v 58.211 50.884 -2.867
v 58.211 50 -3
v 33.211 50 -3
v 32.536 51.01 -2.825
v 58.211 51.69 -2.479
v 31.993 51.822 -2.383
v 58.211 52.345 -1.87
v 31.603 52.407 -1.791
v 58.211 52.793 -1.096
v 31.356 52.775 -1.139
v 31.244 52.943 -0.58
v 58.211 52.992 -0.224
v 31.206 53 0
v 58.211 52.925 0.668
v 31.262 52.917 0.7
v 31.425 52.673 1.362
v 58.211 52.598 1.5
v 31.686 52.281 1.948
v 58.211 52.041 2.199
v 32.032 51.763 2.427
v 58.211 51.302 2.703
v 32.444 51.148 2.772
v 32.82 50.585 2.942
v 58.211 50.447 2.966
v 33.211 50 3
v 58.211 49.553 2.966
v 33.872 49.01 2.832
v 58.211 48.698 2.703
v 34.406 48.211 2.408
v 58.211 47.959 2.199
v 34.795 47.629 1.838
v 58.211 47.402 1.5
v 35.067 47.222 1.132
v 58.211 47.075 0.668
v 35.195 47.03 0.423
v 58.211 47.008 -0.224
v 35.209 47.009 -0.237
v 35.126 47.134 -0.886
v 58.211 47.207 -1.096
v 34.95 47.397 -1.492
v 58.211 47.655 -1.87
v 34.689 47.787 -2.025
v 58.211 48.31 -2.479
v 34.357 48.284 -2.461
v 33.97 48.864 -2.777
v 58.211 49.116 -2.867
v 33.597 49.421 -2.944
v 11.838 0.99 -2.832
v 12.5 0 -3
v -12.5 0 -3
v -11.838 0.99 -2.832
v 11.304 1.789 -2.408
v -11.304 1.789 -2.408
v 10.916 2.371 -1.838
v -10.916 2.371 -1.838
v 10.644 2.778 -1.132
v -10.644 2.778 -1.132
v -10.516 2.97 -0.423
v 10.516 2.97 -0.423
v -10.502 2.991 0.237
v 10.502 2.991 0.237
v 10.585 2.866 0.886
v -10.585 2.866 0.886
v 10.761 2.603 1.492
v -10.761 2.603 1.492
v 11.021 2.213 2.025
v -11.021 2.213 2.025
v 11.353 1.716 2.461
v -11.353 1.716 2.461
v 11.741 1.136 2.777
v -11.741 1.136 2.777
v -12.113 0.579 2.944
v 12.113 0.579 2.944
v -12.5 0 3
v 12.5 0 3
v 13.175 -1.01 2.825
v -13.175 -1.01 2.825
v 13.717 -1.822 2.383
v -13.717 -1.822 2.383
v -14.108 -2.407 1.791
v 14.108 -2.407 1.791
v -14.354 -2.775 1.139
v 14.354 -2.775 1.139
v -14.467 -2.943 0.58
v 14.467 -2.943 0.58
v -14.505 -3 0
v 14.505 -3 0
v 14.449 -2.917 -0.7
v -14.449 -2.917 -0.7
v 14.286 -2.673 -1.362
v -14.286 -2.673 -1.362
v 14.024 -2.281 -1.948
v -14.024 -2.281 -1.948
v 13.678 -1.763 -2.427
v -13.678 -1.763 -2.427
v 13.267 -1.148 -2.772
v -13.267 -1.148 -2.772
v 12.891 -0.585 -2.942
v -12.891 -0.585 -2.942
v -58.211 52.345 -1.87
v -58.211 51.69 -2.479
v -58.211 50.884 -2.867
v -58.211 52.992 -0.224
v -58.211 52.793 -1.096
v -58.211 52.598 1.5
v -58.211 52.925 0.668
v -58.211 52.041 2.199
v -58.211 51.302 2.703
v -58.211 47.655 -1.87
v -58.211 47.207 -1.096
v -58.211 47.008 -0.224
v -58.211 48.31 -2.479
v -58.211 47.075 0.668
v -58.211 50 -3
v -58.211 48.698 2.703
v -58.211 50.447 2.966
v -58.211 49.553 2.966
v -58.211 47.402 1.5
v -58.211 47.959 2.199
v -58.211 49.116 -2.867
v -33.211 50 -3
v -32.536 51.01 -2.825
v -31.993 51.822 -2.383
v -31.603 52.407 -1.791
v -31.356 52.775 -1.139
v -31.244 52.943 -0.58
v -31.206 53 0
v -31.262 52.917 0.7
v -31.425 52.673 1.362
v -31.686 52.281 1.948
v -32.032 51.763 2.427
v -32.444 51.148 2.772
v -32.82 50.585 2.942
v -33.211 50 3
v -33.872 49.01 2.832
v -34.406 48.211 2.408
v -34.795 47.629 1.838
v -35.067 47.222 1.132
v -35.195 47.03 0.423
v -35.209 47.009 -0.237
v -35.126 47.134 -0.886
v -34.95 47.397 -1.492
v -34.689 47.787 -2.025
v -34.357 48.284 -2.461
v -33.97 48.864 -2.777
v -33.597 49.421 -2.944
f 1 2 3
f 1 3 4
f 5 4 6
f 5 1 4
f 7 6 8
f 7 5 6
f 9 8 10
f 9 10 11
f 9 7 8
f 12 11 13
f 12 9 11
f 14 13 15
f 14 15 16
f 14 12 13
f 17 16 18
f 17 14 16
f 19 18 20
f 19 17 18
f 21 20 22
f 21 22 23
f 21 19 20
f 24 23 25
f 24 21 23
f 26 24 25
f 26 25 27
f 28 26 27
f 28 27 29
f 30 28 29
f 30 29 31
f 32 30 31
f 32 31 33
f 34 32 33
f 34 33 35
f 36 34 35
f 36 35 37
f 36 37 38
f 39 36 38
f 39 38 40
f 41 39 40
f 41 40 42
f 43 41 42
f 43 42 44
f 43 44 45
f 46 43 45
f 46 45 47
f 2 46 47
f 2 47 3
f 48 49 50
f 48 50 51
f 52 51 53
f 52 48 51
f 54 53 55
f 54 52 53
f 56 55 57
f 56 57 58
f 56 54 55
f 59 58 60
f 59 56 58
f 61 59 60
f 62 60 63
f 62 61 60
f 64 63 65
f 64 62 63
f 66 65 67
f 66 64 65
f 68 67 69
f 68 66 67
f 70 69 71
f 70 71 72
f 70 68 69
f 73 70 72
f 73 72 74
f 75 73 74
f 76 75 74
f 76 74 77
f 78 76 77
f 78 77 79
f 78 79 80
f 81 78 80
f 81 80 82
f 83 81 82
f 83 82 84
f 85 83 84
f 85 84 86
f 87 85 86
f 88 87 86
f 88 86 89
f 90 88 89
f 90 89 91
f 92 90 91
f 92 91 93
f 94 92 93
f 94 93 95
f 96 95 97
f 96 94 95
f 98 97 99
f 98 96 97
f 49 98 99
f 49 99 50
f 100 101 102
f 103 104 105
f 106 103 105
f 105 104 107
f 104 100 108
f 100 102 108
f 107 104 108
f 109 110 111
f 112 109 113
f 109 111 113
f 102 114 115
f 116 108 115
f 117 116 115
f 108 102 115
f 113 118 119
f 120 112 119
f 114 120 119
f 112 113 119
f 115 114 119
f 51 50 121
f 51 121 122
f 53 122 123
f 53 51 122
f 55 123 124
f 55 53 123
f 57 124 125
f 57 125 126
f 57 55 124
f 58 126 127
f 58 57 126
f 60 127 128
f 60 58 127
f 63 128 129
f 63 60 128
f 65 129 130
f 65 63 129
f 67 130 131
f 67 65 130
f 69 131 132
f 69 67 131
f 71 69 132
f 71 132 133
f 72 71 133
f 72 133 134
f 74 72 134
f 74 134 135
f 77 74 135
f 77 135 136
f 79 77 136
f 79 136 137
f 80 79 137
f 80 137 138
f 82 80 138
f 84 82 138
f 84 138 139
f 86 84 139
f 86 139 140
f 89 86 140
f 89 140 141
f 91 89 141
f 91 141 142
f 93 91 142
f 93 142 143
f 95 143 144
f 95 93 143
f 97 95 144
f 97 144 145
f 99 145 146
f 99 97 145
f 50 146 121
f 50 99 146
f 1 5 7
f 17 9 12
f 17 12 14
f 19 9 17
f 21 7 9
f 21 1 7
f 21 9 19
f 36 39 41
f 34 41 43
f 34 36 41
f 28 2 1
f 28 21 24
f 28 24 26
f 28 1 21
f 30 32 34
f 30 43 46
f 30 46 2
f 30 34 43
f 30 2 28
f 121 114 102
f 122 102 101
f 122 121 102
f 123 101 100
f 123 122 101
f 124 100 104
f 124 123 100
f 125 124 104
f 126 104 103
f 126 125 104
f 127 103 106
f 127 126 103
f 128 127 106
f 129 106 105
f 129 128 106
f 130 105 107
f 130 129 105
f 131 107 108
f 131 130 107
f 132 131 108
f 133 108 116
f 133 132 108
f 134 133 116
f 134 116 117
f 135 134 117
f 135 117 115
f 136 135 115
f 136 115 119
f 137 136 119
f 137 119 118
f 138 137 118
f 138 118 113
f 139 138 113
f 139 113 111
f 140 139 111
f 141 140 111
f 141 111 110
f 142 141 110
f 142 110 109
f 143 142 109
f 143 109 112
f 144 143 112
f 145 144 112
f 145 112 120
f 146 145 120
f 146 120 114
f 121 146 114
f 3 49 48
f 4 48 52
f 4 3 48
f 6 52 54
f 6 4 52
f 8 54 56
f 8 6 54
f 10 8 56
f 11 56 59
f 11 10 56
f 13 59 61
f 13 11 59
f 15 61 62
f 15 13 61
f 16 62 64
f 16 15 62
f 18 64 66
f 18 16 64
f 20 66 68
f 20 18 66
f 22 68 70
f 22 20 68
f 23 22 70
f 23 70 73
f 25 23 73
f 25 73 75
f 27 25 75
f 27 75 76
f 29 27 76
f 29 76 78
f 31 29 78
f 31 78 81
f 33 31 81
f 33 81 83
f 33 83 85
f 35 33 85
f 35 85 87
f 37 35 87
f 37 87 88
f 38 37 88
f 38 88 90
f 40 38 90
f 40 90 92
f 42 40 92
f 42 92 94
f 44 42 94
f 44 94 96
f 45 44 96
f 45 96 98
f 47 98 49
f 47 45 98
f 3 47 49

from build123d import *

# Parameters (mm, degrees)
SKETCH2_R = 3


with BuildPart() as part:
    # Sweep3: sweep along a path in Sketch1
    with BuildLine(Plane.XY) as sweep3_path:
        Line((-58.210678119, 50), (-33.210678119, 50))
        Line((-33.210678119, 50), (-12.5, 0))
        Line((-12.5, 0), (12.5, 0))
        Line((12.5, 0), (33.210678119, 50))
        Line((33.210678119, 50), (58.210678119, 50))
    # Sketch2 → Sweep3 (sweep)
    with BuildSketch(Plane(origin=(49, 0, 0), x_dir=(0, 0, -1), z_dir=(1, 0, 0))):
        with Locations((0, 50)):
            Circle(SKETCH2_R)
    sweep(path=sweep3_path.line, transition=Transition.RIGHT)


solid = part.part
